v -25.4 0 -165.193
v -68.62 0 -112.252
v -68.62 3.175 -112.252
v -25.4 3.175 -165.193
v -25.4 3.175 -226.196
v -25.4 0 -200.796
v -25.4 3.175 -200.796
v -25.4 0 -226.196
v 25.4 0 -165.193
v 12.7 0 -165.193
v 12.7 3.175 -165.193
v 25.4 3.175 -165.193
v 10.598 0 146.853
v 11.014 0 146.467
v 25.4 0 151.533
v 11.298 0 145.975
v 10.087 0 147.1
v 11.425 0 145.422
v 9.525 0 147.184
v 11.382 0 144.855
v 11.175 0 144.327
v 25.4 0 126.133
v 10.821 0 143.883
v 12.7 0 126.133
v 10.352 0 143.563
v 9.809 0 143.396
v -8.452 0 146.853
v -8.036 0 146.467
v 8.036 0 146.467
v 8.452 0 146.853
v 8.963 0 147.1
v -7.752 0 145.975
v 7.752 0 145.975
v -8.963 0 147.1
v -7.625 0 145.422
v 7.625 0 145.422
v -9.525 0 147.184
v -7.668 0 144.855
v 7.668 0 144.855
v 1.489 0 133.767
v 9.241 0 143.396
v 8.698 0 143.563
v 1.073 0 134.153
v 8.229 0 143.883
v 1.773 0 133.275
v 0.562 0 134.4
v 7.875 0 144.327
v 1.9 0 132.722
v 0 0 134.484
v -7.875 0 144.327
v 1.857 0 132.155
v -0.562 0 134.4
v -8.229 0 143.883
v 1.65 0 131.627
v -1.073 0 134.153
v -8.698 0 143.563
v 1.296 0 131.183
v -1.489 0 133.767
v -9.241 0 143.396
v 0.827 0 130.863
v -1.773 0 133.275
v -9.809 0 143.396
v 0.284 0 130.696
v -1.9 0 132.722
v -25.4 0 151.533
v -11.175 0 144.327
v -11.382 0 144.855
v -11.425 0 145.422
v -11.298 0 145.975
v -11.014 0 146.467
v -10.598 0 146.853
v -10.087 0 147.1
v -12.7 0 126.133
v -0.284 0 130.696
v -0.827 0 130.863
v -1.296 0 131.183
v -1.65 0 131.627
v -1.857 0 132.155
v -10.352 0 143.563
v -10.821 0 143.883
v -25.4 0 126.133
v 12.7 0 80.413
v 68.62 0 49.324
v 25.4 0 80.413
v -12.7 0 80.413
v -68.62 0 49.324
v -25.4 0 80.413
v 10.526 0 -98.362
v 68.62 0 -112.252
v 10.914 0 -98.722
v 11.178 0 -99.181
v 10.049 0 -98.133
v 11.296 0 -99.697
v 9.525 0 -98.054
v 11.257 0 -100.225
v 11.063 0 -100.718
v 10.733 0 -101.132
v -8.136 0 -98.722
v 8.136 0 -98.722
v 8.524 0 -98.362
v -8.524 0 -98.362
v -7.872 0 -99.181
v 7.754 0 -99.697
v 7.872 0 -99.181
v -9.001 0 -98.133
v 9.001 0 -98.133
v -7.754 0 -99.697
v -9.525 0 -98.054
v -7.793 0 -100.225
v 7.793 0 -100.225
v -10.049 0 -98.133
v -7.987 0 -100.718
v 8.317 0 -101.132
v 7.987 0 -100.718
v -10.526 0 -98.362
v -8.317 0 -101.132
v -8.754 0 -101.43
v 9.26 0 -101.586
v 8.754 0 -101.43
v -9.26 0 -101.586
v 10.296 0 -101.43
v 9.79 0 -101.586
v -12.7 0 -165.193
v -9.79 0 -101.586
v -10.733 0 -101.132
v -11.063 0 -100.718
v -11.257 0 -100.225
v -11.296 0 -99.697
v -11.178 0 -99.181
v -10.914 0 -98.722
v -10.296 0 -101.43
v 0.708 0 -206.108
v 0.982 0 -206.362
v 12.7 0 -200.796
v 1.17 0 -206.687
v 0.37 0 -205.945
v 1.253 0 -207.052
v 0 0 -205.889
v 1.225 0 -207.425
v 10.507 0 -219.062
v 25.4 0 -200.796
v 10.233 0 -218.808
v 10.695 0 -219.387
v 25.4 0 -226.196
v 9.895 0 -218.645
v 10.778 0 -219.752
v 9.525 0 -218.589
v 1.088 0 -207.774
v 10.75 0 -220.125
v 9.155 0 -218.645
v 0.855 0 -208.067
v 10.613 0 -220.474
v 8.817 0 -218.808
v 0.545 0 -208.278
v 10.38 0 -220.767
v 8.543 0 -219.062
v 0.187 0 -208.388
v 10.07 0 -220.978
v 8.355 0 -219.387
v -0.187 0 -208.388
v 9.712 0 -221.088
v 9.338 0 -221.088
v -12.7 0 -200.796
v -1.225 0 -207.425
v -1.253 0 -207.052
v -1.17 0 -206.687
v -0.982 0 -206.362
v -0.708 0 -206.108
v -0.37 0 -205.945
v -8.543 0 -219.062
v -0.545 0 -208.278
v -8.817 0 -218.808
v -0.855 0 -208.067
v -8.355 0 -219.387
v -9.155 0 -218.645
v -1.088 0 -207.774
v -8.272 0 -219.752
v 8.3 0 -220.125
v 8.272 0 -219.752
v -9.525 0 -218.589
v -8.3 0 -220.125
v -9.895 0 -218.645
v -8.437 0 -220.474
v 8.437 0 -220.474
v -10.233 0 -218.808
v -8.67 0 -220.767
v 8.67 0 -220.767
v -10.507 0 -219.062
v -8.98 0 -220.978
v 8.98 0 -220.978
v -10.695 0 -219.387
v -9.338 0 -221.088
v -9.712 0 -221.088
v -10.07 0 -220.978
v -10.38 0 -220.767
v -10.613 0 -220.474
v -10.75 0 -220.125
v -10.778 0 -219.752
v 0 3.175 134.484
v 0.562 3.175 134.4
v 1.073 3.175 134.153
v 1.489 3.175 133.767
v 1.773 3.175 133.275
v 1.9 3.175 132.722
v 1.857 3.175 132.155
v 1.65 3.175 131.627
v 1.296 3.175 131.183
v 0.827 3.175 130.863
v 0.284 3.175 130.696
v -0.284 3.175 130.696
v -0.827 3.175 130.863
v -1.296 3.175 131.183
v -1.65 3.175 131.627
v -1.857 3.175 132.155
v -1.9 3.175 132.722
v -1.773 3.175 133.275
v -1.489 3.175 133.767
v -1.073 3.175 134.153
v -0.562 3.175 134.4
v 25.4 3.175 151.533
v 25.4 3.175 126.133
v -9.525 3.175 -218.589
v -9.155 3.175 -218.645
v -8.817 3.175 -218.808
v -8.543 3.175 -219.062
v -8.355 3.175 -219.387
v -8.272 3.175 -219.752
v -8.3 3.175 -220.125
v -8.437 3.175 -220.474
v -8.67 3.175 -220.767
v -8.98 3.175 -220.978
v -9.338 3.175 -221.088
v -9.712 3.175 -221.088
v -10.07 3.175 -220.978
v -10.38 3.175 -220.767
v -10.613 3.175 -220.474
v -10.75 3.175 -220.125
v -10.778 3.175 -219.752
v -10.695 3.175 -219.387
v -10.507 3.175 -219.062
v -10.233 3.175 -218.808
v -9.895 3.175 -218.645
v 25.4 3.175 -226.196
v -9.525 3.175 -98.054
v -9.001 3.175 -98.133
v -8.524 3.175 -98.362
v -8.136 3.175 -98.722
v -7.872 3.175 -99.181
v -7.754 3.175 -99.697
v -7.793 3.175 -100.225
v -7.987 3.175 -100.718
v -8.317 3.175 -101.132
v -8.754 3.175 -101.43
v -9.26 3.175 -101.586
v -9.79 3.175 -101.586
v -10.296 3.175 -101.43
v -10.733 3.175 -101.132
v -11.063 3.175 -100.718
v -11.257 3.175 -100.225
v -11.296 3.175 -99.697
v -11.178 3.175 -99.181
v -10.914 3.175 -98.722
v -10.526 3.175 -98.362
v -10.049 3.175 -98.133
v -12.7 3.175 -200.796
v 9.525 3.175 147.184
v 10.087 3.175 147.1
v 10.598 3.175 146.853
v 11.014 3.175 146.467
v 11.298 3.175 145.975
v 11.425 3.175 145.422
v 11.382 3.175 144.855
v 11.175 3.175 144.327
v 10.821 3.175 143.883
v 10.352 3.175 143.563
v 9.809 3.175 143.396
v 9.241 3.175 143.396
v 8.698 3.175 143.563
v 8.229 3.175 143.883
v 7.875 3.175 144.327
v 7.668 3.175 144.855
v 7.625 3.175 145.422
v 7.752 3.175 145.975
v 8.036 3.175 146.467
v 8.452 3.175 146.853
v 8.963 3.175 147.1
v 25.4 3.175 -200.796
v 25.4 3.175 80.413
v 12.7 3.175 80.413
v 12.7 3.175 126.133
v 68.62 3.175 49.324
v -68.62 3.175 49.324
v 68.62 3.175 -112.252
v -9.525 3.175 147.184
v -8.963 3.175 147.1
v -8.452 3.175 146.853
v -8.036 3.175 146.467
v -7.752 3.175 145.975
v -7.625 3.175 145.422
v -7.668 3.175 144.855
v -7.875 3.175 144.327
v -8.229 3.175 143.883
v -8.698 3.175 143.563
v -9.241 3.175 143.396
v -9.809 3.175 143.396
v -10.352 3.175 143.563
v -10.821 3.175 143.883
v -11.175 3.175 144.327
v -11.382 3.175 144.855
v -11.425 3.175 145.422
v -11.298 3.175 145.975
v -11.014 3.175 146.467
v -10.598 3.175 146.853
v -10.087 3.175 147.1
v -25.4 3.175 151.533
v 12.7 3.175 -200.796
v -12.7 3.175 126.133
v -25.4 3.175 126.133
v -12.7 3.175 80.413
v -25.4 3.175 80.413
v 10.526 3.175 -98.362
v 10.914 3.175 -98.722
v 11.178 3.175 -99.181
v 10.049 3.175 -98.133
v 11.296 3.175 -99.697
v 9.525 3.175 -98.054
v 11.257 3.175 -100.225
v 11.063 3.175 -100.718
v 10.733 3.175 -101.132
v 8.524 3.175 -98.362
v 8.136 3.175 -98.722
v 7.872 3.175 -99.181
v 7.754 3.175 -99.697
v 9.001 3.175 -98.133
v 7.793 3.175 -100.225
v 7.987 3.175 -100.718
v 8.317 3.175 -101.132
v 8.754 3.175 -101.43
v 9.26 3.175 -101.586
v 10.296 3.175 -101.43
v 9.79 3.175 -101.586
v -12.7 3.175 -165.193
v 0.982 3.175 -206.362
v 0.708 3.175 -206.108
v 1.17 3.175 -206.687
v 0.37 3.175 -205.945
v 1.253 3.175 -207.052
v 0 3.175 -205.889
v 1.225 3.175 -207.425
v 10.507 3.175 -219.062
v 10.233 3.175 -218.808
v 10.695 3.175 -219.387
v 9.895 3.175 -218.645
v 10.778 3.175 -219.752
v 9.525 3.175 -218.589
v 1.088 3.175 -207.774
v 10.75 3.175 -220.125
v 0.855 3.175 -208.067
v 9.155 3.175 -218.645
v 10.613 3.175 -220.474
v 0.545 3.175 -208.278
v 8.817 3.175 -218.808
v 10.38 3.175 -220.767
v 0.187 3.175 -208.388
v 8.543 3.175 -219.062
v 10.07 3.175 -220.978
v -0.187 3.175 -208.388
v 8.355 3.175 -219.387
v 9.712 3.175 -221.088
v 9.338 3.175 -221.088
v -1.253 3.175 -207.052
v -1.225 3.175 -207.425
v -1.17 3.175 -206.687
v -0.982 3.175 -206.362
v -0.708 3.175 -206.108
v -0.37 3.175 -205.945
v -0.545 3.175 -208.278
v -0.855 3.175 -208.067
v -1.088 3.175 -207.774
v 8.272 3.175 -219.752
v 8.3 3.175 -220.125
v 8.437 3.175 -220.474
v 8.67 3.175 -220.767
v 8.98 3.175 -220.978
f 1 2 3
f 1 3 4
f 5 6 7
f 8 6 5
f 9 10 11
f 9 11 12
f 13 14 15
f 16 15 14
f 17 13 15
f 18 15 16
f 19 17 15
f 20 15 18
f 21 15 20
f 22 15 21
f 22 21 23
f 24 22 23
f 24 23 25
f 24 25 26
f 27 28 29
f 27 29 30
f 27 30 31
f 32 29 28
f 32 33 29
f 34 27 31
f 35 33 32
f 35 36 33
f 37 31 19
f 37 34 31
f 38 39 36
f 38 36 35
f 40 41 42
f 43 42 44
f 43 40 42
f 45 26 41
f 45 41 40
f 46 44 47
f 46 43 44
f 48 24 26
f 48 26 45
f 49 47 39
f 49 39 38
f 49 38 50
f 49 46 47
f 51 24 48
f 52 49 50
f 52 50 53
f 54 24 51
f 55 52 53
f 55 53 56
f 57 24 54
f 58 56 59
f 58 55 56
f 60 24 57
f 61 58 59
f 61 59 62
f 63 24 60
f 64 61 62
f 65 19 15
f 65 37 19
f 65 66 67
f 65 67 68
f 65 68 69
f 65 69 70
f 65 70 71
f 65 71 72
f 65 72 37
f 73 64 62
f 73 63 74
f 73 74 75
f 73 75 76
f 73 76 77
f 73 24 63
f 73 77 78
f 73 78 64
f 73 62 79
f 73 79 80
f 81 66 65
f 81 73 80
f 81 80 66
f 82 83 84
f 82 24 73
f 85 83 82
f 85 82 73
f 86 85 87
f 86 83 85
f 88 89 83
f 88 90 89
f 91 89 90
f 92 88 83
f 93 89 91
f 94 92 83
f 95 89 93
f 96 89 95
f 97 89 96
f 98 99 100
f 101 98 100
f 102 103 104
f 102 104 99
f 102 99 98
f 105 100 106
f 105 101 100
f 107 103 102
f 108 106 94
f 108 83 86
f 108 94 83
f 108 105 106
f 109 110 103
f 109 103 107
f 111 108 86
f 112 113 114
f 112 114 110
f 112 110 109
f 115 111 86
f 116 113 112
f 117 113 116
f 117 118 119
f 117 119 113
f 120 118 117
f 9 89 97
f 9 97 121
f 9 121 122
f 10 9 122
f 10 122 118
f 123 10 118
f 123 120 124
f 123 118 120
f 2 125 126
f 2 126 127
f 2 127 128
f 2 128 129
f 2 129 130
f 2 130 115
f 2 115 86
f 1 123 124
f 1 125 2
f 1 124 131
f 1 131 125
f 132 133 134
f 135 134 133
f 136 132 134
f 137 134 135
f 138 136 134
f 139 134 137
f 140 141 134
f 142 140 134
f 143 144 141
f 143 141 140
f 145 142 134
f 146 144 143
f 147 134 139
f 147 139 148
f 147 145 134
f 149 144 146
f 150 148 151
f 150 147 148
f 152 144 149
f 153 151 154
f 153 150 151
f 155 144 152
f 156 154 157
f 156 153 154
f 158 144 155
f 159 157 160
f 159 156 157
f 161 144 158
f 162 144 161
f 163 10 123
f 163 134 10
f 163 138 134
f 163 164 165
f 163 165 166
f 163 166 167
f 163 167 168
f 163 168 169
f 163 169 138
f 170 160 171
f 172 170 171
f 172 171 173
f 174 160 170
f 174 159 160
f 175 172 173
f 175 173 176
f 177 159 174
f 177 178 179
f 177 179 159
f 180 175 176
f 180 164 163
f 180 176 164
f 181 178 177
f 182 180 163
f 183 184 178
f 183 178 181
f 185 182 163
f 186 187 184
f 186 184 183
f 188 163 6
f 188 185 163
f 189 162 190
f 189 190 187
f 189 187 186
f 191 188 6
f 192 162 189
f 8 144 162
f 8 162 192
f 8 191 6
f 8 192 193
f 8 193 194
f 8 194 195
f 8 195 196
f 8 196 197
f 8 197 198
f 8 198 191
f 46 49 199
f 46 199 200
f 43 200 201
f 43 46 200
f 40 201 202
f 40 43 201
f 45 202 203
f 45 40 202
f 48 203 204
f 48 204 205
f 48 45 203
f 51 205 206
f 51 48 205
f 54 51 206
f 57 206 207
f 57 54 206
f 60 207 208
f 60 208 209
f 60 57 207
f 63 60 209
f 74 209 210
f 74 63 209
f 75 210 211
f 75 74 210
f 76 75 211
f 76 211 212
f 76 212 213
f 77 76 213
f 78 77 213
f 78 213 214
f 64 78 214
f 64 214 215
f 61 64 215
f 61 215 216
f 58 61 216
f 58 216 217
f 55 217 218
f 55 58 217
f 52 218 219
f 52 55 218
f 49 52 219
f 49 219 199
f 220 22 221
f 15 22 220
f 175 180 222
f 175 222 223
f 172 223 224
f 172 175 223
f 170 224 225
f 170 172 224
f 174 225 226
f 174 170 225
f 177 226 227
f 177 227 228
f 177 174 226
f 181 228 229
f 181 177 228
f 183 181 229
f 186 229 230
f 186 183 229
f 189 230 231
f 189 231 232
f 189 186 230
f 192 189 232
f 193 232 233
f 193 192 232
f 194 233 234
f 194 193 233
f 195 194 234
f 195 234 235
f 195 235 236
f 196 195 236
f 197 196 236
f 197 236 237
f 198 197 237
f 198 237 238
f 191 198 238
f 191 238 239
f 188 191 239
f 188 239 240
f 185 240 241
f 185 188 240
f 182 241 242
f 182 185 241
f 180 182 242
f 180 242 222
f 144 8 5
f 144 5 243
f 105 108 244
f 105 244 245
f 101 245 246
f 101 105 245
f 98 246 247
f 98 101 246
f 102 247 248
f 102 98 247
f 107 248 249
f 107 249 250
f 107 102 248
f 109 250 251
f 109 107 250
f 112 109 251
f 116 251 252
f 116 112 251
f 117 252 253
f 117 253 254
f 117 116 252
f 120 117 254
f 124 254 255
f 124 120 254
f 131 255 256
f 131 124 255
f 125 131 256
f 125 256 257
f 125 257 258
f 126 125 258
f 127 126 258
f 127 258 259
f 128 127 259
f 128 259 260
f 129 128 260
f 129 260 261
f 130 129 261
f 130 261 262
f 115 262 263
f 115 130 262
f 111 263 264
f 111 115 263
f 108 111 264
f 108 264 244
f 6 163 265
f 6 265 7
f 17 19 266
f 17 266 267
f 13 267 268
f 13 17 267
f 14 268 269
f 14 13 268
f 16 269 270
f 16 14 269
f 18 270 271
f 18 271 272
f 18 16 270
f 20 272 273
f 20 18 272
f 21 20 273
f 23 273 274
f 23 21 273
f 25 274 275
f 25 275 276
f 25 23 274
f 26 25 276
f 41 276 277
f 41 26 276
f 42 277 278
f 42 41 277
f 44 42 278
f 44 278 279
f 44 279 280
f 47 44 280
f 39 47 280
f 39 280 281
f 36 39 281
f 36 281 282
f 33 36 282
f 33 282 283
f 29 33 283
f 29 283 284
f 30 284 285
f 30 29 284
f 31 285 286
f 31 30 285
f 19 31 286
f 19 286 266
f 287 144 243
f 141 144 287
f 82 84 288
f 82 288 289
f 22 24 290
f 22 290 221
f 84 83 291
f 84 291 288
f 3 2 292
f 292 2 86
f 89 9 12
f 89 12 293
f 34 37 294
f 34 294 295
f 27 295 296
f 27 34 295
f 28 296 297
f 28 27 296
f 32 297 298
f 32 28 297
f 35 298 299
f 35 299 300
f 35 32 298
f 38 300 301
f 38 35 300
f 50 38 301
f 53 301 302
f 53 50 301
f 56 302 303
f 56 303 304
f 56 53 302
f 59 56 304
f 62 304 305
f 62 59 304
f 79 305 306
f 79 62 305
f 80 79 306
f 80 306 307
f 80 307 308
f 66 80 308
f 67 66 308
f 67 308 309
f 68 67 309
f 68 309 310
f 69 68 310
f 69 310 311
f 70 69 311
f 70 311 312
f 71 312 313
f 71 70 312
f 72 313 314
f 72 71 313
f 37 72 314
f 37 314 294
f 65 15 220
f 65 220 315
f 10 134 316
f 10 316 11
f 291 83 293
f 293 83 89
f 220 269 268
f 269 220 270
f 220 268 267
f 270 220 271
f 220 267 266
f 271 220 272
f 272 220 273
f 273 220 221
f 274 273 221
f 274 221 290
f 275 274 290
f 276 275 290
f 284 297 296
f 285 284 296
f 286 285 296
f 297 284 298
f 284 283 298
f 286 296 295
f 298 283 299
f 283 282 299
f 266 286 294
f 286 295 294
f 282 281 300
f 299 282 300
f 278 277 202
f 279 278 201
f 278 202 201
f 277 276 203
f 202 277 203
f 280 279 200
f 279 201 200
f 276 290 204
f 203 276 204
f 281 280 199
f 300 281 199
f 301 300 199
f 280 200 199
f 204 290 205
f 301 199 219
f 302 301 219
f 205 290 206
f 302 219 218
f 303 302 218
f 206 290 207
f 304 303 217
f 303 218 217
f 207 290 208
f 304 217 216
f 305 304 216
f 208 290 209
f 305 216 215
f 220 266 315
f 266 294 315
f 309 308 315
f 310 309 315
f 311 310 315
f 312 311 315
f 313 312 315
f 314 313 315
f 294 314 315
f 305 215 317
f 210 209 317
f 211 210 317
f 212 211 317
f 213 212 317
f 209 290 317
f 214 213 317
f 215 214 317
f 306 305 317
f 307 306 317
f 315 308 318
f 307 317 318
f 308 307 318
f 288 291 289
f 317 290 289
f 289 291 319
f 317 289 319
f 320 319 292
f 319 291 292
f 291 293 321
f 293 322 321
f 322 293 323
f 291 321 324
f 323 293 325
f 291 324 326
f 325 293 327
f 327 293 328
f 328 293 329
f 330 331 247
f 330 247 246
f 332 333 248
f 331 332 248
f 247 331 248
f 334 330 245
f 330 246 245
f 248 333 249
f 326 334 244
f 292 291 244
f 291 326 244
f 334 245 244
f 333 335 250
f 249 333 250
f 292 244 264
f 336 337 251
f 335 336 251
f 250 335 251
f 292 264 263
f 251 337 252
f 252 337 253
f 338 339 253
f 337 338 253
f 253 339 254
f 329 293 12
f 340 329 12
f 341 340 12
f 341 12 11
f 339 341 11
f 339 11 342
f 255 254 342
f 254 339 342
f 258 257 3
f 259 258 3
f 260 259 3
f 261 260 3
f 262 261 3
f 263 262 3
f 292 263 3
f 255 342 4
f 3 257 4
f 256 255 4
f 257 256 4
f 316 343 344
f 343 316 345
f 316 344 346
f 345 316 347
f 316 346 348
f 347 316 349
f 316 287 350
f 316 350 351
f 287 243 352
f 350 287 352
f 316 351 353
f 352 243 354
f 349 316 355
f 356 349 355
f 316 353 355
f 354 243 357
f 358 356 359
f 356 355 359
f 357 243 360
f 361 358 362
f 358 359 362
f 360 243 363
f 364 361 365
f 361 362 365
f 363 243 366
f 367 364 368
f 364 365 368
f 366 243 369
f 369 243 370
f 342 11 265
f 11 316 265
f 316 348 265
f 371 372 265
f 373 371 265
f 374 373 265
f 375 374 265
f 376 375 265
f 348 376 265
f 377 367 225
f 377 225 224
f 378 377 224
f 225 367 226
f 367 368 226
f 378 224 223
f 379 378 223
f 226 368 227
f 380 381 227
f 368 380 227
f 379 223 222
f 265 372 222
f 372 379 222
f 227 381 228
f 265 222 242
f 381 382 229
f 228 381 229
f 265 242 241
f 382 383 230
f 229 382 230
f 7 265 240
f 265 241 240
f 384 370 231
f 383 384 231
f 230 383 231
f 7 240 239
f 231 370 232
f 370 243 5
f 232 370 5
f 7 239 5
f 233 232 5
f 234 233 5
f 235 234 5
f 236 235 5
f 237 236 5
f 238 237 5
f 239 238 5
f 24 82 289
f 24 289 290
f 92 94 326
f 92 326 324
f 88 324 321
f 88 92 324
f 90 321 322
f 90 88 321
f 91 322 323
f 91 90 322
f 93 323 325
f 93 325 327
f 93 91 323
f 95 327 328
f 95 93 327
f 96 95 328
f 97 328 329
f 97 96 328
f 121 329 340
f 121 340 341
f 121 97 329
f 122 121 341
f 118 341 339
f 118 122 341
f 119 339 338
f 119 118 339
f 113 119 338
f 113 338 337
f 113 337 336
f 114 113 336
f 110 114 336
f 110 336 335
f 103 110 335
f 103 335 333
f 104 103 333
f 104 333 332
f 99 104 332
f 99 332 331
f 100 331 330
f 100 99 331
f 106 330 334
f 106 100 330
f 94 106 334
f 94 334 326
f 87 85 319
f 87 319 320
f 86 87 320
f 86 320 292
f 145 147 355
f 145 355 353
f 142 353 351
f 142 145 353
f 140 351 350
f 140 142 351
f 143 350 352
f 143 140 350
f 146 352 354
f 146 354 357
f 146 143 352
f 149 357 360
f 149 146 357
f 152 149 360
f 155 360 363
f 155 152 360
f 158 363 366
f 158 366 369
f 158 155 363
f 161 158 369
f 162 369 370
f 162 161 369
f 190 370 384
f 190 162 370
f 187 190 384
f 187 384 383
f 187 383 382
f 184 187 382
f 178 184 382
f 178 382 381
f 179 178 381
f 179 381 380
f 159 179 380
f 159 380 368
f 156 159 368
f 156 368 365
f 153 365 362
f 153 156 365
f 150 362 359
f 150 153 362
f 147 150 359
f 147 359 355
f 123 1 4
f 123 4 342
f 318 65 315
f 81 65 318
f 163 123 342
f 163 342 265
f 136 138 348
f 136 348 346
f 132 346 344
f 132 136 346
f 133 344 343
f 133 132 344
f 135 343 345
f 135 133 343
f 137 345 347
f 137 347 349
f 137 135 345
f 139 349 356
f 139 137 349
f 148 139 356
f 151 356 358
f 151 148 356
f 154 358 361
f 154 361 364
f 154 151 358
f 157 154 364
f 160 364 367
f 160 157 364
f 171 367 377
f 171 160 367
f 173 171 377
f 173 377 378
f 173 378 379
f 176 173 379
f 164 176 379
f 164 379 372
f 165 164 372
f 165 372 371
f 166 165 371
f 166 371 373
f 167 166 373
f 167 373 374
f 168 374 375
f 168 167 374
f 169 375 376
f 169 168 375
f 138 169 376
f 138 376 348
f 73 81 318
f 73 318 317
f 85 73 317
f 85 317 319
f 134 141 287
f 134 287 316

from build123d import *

# Parameters (mm, degrees)
SKETCH2_R           = 1.256430983
SKETCH2_R_2         = 1.905
SKETCH2_R_3         = 1.776231012
BOSS_EXTRUDE2_DEPTH = 3.175


with BuildPart() as part:
    # Sketch2 → Boss-Extrude2 (new body)
    with BuildSketch(Plane(origin=(0, 0, 0), x_dir=(1, 0, 0), z_dir=(0, 1, 0))):
        Polygon((25.4, -151.533371864), (-25.4, -151.533371864), (-25.4, -126.133371864), (-12.7, -126.133371864), (-12.7, -80.413371864), (-25.4, -80.413371864), (-68.619910987, -49.323669691), (-68.619910987, 0), (-68.619910987, 112.251832626), (-25.4, 165.193433608), (-12.7, 165.193433608), (-12.7, 200.795669484), (-25.4, 200.795669484), (-25.4, 226.195669484), (25.4, 226.195669484), (25.4, 200.795669484), (12.7, 200.795669484), (12.7, 165.193433608), (25.4, 165.193433608), (68.619910987, 112.251832626), (68.619910987, 0), (68.619910987, -49.323669691), (25.4, -80.413371864), (12.7, -80.413371864), (12.7, -126.133371864), (25.4, -126.133371864), align=None)
        with Locations(Location((-9.525, 219.845669484, 0), (0, 0, 270))):
            Circle(SKETCH2_R, mode=Mode.SUBTRACT)
        with Locations(Location((9.525, 219.845669484, 0), (0, 0, 270))):
            Circle(SKETCH2_R, mode=Mode.SUBTRACT)
        with Locations(Location((0, 207.145669484, 0), (0, 0, 270))):
            Circle(SKETCH2_R, mode=Mode.SUBTRACT)
        with Locations(Location((9.525, -145.279330516, 0), (0, 0, 270))):
            Circle(SKETCH2_R_2, mode=Mode.SUBTRACT)
        with Locations(Location((0, -132.579330516, 0), (0, 0, 270))):
            Circle(SKETCH2_R_2, mode=Mode.SUBTRACT)
        with Locations(Location((-9.525, -145.279330516, 0), (0, 0, 270))):
            Circle(SKETCH2_R_2, mode=Mode.SUBTRACT)
        with Locations(Location((-9.525, 99.829892631, 0), (0, 0, 270))):
            Circle(SKETCH2_R_3, mode=Mode.SUBTRACT)
        with Locations(Location((9.525, 99.829892631, 0), (0, 0, 270))):
            Circle(SKETCH2_R_3, mode=Mode.SUBTRACT)
    extrude(amount=BOSS_EXTRUDE2_DEPTH)


solid = part.part
